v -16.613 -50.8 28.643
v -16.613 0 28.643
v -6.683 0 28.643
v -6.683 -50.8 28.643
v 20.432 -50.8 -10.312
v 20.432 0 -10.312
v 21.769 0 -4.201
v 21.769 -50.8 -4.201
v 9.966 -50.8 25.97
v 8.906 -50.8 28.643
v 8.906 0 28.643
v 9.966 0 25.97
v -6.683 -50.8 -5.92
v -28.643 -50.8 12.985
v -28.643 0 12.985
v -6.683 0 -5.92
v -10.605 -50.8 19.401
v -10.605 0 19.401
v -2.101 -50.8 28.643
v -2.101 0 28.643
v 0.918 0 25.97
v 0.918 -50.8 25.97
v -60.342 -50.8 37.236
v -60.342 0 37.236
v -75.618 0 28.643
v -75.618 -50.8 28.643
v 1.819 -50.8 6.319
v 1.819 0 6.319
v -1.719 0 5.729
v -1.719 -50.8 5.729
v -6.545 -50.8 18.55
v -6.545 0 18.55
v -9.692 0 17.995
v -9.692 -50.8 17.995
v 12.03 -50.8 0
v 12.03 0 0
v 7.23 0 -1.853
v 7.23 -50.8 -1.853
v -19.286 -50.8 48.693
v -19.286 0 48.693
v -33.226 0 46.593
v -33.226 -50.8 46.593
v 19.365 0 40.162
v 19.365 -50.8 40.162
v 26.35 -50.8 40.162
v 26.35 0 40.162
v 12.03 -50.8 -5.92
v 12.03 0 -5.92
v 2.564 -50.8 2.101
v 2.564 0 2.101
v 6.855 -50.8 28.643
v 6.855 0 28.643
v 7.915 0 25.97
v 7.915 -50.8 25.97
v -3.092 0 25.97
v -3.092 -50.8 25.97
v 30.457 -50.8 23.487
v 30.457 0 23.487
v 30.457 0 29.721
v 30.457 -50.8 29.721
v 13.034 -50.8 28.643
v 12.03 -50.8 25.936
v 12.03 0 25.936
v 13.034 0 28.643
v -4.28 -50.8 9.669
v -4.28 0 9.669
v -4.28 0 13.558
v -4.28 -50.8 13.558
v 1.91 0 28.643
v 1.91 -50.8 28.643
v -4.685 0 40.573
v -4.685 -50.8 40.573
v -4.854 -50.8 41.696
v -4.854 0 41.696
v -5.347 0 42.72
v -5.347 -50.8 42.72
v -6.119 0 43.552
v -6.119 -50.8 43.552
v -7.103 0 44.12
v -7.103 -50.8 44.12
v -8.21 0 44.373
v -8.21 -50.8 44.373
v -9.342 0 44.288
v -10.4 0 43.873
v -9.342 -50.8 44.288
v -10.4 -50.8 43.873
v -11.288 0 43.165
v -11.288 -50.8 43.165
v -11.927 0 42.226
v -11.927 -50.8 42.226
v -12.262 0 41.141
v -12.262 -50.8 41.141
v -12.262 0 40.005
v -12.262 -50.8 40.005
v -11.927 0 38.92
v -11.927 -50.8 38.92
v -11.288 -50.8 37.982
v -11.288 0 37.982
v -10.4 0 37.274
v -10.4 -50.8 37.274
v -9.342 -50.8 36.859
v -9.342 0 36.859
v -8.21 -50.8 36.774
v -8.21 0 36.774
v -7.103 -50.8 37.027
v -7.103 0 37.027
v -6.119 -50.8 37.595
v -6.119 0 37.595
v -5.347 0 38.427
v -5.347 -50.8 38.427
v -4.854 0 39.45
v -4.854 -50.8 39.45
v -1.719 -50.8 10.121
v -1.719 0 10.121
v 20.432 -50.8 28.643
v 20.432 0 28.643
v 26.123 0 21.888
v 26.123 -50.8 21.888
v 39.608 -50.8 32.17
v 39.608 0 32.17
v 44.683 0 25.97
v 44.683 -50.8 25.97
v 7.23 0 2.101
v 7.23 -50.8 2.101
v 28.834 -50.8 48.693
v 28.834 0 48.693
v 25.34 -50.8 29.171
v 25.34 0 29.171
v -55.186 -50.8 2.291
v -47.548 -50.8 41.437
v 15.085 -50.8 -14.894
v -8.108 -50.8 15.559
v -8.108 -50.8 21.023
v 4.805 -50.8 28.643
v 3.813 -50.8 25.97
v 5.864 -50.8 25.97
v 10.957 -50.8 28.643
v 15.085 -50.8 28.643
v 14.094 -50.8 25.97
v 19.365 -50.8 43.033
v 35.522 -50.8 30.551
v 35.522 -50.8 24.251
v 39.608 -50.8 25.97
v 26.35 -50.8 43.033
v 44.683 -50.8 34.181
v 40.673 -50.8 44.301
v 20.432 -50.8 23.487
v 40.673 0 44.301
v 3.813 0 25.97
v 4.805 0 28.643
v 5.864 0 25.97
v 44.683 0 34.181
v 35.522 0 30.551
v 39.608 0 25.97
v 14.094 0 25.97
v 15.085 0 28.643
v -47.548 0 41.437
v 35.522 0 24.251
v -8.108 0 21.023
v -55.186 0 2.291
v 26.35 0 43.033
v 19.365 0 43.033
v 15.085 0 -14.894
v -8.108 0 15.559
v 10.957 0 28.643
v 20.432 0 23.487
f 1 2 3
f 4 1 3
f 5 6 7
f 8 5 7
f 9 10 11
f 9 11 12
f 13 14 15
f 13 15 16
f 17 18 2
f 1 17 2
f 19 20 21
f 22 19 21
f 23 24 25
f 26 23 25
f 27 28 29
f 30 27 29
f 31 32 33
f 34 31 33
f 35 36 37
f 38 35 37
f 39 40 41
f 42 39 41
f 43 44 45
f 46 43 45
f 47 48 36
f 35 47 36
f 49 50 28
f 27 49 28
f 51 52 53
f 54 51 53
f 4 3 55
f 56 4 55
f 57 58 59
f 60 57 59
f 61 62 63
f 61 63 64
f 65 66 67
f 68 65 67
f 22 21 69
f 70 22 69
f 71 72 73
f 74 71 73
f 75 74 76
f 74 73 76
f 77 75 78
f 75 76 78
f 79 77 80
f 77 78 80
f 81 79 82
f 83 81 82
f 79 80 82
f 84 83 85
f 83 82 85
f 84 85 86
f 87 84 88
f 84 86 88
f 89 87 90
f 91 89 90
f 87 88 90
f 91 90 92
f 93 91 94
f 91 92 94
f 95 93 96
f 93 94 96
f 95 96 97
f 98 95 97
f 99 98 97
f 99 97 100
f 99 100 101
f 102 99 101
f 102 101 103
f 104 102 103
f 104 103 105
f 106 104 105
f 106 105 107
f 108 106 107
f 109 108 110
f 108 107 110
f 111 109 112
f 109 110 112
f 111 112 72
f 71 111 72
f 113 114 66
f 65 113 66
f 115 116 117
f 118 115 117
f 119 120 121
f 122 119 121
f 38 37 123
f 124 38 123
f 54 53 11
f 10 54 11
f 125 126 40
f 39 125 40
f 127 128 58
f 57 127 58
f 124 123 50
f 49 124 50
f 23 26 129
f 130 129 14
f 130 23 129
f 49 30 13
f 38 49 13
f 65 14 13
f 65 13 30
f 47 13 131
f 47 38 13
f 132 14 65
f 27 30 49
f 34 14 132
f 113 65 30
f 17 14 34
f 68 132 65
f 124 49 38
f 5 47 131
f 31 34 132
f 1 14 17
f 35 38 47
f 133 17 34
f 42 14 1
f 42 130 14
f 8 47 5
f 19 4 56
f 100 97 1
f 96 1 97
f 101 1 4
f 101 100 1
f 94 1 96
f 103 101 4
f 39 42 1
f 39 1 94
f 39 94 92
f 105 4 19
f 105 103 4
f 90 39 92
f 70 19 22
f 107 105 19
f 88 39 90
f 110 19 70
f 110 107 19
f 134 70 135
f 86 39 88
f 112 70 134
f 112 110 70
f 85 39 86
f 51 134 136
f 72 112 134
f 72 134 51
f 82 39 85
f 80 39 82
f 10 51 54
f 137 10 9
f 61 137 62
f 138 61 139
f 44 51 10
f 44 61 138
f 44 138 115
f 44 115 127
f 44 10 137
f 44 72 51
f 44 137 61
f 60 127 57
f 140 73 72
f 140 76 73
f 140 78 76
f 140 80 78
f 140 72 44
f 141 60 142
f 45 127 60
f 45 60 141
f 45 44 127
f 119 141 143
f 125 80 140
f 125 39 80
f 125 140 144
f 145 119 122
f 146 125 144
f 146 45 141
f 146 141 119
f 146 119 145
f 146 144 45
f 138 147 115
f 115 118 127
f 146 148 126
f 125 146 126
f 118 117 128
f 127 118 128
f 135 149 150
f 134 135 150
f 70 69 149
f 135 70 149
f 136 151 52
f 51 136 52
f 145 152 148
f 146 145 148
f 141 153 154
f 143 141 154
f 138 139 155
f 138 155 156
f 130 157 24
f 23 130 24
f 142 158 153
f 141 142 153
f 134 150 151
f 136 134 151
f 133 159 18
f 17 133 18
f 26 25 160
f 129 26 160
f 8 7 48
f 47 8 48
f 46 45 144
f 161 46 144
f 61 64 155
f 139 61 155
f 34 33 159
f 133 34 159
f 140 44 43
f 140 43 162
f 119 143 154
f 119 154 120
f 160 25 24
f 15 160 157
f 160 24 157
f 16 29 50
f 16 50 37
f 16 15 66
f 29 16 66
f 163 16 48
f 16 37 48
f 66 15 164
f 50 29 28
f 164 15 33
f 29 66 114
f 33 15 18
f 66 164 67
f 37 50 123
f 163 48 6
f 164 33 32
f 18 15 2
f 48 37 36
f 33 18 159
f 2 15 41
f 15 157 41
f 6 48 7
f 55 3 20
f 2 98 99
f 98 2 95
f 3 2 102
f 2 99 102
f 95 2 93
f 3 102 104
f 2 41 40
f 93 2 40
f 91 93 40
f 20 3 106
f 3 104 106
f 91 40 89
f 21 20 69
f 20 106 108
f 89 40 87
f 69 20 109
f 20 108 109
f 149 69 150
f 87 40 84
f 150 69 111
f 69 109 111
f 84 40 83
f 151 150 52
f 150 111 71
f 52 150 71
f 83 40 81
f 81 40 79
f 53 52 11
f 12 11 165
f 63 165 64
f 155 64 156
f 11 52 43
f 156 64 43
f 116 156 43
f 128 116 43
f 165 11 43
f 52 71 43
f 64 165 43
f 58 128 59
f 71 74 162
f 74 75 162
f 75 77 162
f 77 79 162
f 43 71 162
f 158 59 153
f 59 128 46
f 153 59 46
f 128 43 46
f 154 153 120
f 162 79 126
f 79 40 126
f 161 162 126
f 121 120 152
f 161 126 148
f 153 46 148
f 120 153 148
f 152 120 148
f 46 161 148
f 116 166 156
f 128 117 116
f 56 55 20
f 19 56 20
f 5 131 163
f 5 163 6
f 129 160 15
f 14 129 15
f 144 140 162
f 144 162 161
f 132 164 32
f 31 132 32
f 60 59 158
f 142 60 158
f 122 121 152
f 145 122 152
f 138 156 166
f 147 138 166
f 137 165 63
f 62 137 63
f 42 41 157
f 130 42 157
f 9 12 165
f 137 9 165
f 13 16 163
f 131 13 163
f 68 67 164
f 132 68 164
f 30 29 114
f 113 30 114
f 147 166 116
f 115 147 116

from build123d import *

# Parameters (mm, degrees)
F1_DEPTH = 50.8
F2_W     = 6.985
F2_H     = 2.8702
F3_DEPTH = 50.8
F4_R     = 3.81
F5_DEPTH = 50.8


with BuildPart() as f1:
    # F0 (on Front) → F1 (new body)
    with BuildSketch(Plane.XZ):
        Polygon((-33.22611, 46.59294), (-47.547709, 41.43716), (-60.341675, 37.236158), (-75.618044, 28.643196), (-55.185895, 2.291456), (-28.643198, 12.984917), (-6.683412, -5.919594), (15.085417, -14.894464), (20.432146, -10.311551), (12.030142, -5.919594), (7.230051, -1.85285), (2.563801, 2.100501), (-1.718592, 5.72864), (-4.279601, 9.668654), (-8.108484, 15.559242), (-9.691619, 17.994835), (-10.605306, 19.400507), (-16.613055, 28.643196), (-6.683412, 28.643196), (-2.100501, 28.643196), (1.909546, 28.643196), (4.804504, 28.643196), (6.855496, 28.643196), (8.906488, 28.643196), (10.957481, 28.643196), (13.034425, 28.643196), (15.085417, 28.643196), (20.432146, 28.643196), (25.340278, 29.170681), (30.457475, 29.720634), (34.531654, 30.158492), (35.521915, 30.55086), (39.607522, 32.169688), (44.683389, 34.180883), (40.673338, 44.301476), (28.834153, 48.693441), (-19.28642, 48.693441), align=None)
        Polygon((44.683389, 25.969833), (44.683389, 34.180883), (39.607522, 32.169688), align=None)
        Polygon((39.607522, 25.969833), (39.607522, 32.169688), (35.521915, 30.55086), align=None)
        Polygon((35.521915, 24.251241), (35.521915, 30.55086), (34.531654, 30.158492), (30.457475, 29.720634), align=None)
        Polygon((12.030142, -5.919594), (20.432146, -10.311551), (21.768831, -4.201002), align=None)
        Polygon((7.230051, -1.85285), (12.030142, -5.919594), (12.030142, 0), align=None)
        Polygon((30.457475, 23.487423), (30.457475, 29.720634), (25.340278, 29.170681), align=None)
        Polygon((2.563801, 2.100501), (7.230051, -1.85285), (7.230051, 2.100501), align=None)
        Polygon((26.12297, 21.887899), (25.340278, 29.170681), (20.432146, 28.643196), align=None)
        Polygon((-1.718592, 5.72864), (2.563801, 2.100501), (1.819311, 6.319278), align=None)
        Polygon((20.432146, 23.487423), (20.432146, 28.643196), (15.085417, 28.643196), align=None)
        Polygon((-4.279601, 9.668654), (-1.718592, 5.72864), (-1.718592, 10.120597), align=None)
        Polygon((14.093683, 25.969833), (15.085417, 28.643196), (13.034425, 28.643196), align=None)
        Polygon((-8.108484, 15.559242), (-4.279601, 9.668654), (-4.279601, 13.557781), align=None)
        Polygon((12.030142, 25.936006), (13.034425, 28.643196), (10.957481, 28.643196), align=None)
        Polygon((-9.691619, 17.994835), (-8.108484, 15.559242), (-6.545077, 18.550107), align=None)
        Polygon((9.965747, 25.969833), (10.957481, 28.643196), (8.906488, 28.643196), align=None)
        Polygon((-10.605306, 19.400507), (-9.691619, 17.994835), (-8.108484, 21.023442), align=None)
        Polygon((7.914755, 25.969833), (8.906488, 28.643196), (6.855496, 28.643196), align=None)
        Polygon((5.863763, 25.969833), (6.855496, 28.643196), (4.804504, 28.643196), align=None)
        Polygon((3.812771, 25.969833), (4.804504, 28.643196), (1.909546, 28.643196), align=None)
        Polygon((-2.100501, 28.643196), (-6.683412, 28.643196), (-3.092235, 25.969833), align=None)
        Polygon((0.917812, 25.969833), (1.909546, 28.643196), (-2.100501, 28.643196), align=None)
    extrude(amount=F1_DEPTH)

    # F2 (on face) → F3 (cut)
    with BuildSketch(Plane.XZ.offset(50.8)):
        with Locations((22.857464, 41.59747)):
            Rectangle(F2_W, F2_H)
    extrude(amount=-F3_DEPTH, mode=Mode.SUBTRACT)

    # F4 (on face) → F5 (cut)
    with BuildSketch(Plane.XZ.offset(50.8)):
        with Locations((-8.494654, 40.573284)):
            Circle(F4_R)
    extrude(amount=-F5_DEPTH, mode=Mode.SUBTRACT)


solid = f1.part
